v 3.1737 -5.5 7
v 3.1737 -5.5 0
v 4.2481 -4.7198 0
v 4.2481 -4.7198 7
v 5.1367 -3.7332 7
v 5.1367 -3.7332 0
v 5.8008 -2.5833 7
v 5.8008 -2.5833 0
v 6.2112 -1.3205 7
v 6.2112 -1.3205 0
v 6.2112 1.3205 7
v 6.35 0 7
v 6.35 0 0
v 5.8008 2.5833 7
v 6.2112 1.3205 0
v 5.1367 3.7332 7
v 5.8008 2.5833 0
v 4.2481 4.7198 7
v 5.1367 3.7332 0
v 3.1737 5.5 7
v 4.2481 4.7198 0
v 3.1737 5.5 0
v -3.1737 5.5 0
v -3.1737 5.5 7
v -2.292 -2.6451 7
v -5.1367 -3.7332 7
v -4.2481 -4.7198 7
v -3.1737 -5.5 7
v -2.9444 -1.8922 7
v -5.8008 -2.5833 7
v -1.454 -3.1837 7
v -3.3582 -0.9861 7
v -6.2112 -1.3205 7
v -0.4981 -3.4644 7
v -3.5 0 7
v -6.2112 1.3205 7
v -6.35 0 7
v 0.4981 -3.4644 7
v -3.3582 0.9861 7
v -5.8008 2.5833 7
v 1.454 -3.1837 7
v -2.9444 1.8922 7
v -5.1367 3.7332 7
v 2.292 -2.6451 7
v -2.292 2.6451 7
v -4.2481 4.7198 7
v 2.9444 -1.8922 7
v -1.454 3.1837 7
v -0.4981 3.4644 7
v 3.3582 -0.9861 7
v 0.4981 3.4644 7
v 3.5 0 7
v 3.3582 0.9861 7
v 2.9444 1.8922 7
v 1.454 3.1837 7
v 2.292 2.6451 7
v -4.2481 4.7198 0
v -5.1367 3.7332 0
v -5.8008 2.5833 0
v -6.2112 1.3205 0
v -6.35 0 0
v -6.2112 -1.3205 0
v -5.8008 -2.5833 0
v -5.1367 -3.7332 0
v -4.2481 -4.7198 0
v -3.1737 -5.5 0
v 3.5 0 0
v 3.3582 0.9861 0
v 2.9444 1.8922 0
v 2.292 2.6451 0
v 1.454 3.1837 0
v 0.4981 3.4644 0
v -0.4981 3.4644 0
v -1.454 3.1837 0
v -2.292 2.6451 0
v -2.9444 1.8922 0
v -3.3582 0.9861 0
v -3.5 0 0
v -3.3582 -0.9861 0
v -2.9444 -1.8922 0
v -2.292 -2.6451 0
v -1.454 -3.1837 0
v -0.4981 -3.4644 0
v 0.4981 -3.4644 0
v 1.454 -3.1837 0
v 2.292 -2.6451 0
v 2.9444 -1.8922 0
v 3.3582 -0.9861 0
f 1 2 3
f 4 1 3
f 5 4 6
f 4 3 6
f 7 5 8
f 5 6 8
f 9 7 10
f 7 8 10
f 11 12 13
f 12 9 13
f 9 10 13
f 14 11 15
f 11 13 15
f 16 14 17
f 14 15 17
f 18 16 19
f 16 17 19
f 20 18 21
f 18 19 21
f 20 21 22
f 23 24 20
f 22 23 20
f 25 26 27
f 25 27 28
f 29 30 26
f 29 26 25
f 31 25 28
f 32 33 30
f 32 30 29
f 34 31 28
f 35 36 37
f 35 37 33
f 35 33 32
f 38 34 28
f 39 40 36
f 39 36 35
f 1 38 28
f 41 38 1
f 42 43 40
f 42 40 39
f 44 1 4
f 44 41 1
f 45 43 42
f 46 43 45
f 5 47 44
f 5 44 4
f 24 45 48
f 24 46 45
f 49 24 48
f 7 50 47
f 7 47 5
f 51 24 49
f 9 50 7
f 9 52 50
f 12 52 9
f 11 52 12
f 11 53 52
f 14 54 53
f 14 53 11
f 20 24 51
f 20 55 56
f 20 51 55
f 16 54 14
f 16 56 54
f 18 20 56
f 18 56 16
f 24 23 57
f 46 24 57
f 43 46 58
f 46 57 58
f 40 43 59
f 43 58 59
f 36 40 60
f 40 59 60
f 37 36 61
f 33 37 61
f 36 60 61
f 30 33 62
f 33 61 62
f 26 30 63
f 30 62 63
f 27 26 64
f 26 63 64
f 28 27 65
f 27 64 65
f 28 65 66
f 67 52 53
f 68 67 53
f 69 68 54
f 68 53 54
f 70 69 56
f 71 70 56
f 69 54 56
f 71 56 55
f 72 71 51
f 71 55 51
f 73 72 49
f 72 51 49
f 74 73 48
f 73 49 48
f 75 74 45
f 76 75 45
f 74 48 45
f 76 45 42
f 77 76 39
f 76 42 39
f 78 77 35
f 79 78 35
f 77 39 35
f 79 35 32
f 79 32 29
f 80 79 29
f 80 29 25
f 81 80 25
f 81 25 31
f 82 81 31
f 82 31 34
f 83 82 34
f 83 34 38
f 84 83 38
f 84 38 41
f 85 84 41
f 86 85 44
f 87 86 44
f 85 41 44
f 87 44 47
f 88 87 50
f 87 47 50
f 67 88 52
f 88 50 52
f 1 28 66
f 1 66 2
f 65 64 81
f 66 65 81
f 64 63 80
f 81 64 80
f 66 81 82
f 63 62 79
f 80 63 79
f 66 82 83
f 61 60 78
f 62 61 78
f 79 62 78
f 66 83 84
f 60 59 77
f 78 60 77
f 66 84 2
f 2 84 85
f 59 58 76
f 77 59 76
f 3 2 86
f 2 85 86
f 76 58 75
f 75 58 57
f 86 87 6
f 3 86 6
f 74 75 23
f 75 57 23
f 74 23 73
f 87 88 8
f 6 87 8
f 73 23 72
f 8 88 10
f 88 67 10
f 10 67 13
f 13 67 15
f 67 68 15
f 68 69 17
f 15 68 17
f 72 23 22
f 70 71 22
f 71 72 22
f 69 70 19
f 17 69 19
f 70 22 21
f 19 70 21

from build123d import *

# Parameters (mm, degrees)
ESQUISSE1_R             = 6.35
BOSS_EXTRU_1_DEPTH      = 7
ESQUISSE2_R             = 3.5
ENL_V_MAT_EXTRU_1_DEPTH = 7
ESQUISSE3_W             = 10.71653065
ESQUISSE3_H             = 1.876238016
ENL_V_MAT_EXTRU_2_DEPTH = 12.386175829


with BuildPart() as part:
    # Esquisse1 → Boss.-Extru.1 (new body)
    with BuildSketch(Plane.XY):
        Circle(ESQUISSE1_R)
    extrude(amount=BOSS_EXTRU_1_DEPTH)

    # Esquisse2 → Enlèv. mat.-Extru.1 (cut)
    with BuildSketch(Plane.XY.offset(7)):
        Circle(ESQUISSE2_R)
    extrude(amount=-ENL_V_MAT_EXTRU_1_DEPTH, mode=Mode.SUBTRACT)

    # Esquisse3 → Enlèv. mat.-Extru.2 (cut, through all)
    with BuildSketch(Plane.XY.offset(7)):
        with Locations((0.338060904, 6.438119008)):
            Rectangle(ESQUISSE3_W, ESQUISSE3_H)
        with Locations((0.338060904, -6.438119008)):
            Rectangle(ESQUISSE3_W, ESQUISSE3_H)
    extrude(amount=-ENL_V_MAT_EXTRU_2_DEPTH, mode=Mode.SUBTRACT)


solid = part.part
